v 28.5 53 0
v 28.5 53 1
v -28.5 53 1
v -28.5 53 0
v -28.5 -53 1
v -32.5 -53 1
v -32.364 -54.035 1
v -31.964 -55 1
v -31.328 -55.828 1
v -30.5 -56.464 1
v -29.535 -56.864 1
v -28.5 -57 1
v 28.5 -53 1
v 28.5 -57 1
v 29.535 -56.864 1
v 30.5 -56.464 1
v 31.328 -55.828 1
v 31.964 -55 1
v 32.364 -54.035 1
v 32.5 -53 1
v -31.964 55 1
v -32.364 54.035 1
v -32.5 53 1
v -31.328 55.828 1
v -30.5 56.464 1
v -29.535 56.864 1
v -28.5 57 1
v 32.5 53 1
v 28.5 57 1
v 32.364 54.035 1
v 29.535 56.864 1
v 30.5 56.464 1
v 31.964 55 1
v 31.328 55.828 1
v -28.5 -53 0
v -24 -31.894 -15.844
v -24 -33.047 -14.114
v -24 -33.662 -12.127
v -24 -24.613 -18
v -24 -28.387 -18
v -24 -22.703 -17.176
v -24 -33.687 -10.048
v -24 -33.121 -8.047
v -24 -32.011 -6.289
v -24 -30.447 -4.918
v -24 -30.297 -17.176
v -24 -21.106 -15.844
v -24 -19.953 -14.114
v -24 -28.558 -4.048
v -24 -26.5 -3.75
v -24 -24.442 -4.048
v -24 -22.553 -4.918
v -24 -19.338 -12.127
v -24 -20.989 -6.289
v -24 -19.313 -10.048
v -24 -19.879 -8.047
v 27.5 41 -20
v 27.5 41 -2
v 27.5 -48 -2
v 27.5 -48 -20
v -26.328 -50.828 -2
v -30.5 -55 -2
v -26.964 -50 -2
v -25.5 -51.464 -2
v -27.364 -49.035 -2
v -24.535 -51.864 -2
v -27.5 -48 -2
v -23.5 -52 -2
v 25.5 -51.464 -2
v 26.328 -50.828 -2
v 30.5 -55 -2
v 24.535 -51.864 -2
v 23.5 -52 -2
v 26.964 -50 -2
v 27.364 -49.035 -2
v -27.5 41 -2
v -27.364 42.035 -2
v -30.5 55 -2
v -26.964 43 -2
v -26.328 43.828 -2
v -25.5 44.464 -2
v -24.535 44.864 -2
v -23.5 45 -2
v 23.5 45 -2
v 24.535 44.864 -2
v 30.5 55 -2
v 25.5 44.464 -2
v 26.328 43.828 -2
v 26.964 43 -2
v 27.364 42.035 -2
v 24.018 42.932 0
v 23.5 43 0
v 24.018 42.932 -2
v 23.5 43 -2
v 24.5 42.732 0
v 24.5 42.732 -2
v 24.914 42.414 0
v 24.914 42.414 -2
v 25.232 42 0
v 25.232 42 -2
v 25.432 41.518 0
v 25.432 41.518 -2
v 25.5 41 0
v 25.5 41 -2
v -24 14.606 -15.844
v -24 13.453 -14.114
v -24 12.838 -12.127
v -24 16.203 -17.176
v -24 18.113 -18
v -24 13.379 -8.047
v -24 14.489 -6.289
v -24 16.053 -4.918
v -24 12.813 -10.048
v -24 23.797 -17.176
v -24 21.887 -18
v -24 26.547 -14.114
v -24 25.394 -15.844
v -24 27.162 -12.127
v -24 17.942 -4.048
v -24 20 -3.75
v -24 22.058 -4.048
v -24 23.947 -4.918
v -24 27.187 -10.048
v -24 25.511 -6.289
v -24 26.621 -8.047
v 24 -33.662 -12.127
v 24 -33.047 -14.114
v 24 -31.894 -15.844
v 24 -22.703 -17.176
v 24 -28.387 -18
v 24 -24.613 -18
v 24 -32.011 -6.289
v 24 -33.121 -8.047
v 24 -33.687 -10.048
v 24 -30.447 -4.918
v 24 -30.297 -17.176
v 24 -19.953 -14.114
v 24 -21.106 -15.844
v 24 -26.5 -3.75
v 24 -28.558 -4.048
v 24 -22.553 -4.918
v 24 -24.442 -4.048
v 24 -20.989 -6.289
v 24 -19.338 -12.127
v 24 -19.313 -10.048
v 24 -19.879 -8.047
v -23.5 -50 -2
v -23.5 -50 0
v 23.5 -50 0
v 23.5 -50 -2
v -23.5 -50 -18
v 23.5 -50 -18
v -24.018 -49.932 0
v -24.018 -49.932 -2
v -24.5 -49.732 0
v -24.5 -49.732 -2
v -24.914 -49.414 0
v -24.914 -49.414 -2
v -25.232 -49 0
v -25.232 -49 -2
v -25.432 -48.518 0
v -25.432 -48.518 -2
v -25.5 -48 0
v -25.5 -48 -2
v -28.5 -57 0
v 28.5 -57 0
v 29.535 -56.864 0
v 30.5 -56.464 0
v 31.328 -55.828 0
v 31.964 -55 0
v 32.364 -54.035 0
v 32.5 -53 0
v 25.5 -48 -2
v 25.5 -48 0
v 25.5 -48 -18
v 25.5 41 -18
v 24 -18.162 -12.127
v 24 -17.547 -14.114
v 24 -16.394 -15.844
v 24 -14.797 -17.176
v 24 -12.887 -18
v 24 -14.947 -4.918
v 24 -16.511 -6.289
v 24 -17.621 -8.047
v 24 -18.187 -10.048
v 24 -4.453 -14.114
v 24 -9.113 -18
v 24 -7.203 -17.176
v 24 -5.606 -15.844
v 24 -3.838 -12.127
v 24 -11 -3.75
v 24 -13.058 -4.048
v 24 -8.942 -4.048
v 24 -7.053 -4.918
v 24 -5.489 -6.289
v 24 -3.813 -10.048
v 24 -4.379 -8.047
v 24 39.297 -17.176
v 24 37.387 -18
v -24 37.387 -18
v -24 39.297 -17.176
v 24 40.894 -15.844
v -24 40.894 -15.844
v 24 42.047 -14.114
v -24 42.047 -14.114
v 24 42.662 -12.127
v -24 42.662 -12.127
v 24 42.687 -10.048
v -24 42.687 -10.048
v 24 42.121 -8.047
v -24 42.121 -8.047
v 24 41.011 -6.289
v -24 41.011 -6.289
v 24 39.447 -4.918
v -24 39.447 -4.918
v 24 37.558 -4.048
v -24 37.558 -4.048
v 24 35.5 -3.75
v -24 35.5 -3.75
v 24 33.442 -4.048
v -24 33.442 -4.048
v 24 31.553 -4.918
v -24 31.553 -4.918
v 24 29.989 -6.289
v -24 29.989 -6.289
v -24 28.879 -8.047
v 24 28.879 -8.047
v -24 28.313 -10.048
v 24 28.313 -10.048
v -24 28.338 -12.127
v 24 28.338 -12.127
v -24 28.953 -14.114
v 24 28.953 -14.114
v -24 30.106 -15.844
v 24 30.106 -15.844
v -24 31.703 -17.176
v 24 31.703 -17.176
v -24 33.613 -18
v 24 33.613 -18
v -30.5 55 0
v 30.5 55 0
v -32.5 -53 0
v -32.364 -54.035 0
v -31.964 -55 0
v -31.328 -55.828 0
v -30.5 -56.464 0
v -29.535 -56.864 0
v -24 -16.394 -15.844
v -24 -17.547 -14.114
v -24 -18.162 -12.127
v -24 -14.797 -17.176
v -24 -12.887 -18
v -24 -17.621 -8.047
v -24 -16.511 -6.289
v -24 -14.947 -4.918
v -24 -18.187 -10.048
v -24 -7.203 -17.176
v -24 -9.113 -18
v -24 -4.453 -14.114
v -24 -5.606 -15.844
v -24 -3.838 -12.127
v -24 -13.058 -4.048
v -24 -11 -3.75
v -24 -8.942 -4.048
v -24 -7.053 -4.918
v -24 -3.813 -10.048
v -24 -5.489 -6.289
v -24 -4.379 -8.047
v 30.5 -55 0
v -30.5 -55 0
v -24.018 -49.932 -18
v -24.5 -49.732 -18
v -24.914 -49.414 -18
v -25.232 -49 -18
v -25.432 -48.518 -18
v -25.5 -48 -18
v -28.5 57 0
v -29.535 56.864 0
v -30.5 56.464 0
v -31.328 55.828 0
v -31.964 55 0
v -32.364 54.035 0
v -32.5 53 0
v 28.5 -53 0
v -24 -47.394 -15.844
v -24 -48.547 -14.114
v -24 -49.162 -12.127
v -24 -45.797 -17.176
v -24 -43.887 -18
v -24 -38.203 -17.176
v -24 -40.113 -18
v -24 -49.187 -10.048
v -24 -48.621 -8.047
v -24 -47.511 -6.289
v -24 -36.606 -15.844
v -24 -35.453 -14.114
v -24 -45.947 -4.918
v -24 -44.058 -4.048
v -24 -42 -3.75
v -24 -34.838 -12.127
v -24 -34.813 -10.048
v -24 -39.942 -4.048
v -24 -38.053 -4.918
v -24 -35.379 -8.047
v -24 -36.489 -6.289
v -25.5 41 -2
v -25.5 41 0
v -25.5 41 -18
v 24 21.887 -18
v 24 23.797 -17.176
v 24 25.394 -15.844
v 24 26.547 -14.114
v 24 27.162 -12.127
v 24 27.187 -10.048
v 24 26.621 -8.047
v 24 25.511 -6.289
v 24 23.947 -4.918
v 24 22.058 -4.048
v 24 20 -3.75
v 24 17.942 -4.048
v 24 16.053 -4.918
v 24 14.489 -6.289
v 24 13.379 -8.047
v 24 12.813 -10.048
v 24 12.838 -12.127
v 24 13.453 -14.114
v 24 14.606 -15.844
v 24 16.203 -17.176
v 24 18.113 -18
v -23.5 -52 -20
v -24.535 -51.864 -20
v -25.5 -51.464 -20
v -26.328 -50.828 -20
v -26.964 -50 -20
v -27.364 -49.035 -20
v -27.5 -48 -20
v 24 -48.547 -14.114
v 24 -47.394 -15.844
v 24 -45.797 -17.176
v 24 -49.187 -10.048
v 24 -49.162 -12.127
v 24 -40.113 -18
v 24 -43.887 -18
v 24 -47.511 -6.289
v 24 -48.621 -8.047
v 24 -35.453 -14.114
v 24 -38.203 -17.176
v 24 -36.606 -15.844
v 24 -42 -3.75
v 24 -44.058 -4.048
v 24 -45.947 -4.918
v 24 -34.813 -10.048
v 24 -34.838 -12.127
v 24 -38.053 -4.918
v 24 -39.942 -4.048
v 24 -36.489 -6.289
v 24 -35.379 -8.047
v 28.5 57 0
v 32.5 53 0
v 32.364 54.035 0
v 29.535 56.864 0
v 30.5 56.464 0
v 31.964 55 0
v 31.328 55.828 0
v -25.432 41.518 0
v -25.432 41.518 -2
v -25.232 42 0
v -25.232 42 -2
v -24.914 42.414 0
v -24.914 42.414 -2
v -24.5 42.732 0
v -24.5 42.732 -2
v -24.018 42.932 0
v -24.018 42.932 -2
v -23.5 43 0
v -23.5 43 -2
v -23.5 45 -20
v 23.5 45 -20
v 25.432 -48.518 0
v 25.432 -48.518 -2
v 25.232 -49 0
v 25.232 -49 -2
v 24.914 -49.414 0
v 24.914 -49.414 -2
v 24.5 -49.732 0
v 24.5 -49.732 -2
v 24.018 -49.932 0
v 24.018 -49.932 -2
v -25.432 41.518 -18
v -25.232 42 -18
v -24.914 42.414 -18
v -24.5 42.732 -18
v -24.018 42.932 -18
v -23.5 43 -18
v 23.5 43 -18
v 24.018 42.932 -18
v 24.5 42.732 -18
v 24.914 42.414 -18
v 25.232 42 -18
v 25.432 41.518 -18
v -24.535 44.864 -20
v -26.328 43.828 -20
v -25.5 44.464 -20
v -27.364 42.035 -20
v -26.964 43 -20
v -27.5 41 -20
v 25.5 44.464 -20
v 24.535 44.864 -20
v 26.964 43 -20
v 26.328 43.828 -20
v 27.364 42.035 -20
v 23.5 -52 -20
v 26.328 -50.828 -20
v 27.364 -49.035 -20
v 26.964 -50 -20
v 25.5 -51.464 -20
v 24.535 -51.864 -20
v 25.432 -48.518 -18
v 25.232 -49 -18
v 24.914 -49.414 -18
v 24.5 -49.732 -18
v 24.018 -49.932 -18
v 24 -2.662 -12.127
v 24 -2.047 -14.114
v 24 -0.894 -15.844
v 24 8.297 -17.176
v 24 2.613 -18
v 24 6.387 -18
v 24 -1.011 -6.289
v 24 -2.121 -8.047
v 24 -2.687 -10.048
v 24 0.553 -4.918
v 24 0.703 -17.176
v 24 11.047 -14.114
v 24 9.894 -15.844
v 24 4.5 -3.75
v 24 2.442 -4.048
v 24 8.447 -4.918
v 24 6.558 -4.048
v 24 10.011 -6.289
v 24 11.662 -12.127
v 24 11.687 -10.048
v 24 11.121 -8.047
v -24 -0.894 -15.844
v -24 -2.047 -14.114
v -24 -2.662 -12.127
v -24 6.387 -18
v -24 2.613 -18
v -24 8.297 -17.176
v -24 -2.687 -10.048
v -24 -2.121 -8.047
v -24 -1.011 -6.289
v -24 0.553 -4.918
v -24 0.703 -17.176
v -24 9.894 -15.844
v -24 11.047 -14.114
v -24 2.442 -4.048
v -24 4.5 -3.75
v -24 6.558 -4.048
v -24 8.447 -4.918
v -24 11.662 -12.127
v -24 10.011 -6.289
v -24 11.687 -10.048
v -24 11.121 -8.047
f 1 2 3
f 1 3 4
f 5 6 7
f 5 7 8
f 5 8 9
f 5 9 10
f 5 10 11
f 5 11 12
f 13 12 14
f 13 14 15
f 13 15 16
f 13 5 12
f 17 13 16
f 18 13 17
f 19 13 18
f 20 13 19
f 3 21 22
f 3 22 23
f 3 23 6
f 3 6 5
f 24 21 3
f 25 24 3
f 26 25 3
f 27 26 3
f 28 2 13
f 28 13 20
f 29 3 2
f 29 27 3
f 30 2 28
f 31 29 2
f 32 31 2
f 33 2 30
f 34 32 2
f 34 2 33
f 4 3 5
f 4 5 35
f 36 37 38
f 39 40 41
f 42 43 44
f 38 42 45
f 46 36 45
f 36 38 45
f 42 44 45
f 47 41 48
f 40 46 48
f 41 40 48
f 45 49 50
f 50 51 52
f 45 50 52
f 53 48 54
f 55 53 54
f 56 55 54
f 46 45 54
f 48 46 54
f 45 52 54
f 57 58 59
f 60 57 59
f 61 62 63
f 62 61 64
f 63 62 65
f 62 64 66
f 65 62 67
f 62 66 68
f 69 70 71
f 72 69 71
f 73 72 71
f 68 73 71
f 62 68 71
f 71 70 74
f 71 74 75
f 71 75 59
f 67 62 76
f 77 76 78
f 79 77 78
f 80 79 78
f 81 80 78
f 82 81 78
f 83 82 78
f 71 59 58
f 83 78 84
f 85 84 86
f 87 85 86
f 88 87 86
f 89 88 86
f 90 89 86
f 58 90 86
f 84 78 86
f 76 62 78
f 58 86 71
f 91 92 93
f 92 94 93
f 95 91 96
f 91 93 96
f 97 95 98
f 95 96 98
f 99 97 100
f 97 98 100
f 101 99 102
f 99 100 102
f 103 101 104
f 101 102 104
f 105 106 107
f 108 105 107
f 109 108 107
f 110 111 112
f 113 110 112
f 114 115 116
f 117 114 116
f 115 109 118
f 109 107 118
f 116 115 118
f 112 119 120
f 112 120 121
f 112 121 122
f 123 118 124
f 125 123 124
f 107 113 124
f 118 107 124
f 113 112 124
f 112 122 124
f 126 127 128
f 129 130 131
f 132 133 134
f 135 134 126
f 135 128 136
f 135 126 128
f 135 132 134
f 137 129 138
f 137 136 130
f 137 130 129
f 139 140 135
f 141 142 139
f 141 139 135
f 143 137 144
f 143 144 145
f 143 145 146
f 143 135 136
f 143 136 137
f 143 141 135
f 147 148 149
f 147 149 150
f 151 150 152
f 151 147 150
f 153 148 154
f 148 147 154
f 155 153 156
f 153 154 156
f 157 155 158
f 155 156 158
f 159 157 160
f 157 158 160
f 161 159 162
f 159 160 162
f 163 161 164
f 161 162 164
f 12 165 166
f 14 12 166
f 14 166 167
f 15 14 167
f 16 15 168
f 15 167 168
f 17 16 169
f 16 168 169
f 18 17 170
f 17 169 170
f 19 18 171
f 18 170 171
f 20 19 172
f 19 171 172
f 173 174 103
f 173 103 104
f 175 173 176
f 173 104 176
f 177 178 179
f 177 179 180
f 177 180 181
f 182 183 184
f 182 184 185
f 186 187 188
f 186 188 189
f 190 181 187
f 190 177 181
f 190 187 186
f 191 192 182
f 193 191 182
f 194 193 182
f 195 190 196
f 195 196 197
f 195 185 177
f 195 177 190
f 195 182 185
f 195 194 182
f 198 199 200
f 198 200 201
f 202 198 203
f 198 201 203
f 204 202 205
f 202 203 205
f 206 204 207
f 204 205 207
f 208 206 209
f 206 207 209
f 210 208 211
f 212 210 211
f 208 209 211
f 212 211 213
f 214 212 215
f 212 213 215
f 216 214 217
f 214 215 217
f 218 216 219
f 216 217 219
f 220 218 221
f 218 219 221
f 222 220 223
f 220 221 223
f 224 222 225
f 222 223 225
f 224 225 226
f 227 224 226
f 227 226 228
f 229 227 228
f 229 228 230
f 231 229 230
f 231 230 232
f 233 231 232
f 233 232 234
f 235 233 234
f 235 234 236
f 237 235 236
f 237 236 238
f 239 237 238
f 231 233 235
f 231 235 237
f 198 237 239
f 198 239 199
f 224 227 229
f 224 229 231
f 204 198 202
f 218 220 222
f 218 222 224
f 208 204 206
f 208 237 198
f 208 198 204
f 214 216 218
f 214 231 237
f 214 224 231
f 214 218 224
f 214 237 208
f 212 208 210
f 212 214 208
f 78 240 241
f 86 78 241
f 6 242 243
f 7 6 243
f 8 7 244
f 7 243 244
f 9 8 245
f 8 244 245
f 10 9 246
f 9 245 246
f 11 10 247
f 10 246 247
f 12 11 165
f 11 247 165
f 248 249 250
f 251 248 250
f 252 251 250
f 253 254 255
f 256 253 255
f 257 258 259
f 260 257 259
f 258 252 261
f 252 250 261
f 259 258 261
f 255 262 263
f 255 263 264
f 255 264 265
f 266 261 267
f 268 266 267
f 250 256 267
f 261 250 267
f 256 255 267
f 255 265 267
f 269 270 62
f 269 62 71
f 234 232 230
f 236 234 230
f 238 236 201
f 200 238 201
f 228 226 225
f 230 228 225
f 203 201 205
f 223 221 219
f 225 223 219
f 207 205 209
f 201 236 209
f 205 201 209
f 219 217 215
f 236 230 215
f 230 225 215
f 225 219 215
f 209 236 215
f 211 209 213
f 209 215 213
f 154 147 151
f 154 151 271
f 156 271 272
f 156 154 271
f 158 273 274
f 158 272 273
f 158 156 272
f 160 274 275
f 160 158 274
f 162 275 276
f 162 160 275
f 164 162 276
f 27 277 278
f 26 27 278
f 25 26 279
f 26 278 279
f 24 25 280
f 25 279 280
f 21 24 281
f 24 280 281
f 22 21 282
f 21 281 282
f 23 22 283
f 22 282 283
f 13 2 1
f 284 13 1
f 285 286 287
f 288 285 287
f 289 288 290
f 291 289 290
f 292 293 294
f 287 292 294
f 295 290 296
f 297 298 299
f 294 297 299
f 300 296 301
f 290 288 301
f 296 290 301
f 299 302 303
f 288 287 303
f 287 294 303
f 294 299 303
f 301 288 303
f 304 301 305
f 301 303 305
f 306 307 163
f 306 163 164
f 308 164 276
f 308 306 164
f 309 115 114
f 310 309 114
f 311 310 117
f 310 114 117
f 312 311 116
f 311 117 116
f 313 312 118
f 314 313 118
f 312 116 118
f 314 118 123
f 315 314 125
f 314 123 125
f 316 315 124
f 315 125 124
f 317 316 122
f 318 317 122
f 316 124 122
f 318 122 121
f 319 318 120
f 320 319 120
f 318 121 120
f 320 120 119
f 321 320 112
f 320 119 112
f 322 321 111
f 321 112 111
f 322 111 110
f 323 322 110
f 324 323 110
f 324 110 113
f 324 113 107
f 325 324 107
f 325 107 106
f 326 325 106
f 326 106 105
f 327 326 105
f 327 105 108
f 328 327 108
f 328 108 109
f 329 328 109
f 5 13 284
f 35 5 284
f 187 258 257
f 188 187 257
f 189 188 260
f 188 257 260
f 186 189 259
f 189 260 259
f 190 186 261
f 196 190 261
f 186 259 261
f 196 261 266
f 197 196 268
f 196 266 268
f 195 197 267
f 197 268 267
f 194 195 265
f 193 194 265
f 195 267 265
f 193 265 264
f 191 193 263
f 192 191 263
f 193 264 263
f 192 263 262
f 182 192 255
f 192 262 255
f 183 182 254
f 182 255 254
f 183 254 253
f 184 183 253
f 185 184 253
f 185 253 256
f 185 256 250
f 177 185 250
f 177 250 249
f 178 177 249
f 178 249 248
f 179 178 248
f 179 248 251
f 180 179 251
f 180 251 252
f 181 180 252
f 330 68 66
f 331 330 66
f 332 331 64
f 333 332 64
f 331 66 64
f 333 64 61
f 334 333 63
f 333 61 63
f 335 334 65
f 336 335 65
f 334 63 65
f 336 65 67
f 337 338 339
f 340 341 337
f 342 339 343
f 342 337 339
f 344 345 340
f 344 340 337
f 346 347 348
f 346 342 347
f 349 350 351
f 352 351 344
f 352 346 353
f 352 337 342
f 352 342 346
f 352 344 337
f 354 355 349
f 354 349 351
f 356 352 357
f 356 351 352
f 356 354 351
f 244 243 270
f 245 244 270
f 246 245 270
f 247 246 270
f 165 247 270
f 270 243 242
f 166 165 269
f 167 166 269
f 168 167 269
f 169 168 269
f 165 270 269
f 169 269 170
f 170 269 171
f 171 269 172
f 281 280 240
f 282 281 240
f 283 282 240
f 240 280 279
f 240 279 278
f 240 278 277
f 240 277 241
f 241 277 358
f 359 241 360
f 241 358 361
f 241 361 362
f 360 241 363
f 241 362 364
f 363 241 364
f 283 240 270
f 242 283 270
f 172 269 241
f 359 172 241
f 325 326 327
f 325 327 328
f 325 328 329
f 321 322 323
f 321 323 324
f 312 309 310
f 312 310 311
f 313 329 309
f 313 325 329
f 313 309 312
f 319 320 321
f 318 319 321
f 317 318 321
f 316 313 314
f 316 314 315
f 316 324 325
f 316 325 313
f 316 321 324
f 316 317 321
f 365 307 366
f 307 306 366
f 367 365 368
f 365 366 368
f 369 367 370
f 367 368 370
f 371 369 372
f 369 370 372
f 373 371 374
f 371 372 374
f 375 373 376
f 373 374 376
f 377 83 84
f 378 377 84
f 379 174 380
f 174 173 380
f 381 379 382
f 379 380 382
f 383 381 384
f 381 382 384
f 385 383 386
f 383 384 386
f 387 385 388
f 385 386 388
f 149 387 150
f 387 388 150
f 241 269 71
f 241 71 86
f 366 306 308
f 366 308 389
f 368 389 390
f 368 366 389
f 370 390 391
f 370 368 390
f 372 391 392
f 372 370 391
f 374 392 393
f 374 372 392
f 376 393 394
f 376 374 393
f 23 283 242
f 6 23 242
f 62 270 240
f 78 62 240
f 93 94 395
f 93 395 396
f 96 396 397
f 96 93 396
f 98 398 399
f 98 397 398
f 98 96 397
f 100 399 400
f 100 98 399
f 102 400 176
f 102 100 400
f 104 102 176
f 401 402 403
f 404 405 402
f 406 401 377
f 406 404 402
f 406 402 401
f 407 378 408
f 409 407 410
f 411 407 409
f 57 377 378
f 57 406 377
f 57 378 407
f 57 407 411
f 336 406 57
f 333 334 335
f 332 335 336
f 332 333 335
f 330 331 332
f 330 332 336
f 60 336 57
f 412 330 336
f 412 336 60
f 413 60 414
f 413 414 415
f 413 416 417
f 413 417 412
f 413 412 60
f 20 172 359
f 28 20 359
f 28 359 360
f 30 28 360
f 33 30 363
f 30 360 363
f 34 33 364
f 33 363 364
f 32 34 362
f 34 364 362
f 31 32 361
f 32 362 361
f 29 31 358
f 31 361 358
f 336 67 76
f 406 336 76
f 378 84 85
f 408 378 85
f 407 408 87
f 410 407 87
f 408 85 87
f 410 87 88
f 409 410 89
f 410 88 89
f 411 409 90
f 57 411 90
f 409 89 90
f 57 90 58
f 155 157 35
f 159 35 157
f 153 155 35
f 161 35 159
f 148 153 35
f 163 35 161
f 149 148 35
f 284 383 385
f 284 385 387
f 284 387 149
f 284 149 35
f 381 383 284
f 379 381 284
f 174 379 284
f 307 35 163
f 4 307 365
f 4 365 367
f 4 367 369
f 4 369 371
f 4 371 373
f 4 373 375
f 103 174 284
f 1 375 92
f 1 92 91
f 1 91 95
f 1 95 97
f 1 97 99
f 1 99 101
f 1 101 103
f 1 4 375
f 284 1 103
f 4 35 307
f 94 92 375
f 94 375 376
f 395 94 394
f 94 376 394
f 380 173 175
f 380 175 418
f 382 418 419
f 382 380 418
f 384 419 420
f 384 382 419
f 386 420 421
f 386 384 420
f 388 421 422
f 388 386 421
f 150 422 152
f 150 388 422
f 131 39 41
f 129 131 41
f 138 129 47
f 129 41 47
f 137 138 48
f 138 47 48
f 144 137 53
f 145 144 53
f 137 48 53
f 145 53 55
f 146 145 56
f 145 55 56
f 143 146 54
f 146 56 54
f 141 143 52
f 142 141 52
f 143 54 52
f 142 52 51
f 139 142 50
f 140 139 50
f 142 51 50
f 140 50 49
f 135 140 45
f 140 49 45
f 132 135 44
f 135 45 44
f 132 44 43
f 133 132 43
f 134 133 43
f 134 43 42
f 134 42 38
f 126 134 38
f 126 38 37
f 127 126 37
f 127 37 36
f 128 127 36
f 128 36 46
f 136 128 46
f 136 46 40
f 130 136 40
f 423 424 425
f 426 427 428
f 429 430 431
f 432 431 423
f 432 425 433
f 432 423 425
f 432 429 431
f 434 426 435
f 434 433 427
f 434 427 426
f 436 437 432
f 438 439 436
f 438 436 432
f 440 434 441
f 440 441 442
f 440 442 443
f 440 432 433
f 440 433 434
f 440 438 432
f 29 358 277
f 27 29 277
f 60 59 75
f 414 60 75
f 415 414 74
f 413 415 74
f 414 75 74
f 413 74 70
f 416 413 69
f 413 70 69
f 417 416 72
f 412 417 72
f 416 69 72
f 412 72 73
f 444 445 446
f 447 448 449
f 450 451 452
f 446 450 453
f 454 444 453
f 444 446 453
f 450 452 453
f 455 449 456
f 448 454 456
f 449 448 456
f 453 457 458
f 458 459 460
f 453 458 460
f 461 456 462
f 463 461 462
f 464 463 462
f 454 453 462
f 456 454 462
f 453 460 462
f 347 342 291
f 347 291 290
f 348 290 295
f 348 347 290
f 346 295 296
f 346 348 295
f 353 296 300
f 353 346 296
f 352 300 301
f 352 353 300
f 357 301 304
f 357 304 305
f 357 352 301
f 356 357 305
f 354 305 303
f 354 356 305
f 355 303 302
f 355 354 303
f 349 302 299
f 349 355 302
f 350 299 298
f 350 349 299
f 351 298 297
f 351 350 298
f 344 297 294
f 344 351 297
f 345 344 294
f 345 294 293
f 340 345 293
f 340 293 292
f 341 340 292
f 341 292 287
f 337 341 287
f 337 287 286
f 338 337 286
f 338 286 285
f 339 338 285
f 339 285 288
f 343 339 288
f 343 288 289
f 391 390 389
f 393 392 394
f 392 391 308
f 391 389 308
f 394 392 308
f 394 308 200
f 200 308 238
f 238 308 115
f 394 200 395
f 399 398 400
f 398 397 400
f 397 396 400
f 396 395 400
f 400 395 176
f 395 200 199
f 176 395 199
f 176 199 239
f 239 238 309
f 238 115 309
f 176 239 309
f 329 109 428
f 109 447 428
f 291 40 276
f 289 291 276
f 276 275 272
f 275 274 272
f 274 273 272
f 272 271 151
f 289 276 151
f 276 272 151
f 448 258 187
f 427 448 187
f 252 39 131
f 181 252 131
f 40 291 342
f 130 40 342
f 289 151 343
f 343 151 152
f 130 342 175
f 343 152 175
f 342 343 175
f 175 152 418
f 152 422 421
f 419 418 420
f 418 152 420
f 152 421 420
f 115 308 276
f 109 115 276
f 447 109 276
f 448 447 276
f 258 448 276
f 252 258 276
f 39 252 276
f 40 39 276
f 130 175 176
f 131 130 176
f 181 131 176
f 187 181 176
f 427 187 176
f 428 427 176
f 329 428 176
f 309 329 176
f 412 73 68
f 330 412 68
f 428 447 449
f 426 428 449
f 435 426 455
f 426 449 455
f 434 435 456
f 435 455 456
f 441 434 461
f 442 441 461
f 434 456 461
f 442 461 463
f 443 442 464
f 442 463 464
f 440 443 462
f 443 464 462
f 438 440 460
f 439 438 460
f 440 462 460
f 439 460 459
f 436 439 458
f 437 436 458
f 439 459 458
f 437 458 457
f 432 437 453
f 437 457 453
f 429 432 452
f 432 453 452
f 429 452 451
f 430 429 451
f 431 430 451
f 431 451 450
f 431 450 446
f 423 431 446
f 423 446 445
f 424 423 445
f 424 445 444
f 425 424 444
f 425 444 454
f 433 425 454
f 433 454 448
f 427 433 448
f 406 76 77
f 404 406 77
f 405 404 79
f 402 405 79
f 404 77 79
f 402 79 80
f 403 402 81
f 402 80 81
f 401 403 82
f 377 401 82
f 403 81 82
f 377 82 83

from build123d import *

# Parameters (mm, degrees)
F1_DEPTH     = 1
F2_W         = 61
F2_H         = 110
F3_DEPTH     = 2
F5_DEPTH     = 18
F6_T         = 2
F6_T3_DEPTH  = 114
F6_T5_DEPTH  = 65
F6_T7_DEPTH  = 51
F6_T9_DEPTH  = 93
F6_T12_ANGLE = 90.000000001
F6_T14_ANGLE = 90.000000001
F6_T16_ANGLE = 90.000000001
F6_T18_ANGLE = 90.000000001
F7_R         = 7.25
F8_DEPTH     = 24


# Not quite as in the source:
# - a shell that OpenCascade refuses in one call is made with other operations: the cavity is built on its own and cut out


with BuildPart() as f1:
    # F0 (on Top) → F1 (new body)
    with BuildSketch(Plane.XY):
        with BuildLine():
            ThreePointArc((32.5, 53), (31.3284271247, 55.8284271247), (28.5, 57))
            Line((28.5, 57), (-28.5, 57))
            ThreePointArc((-28.5, 57), (-31.3284271247, 55.8284271247), (-32.5, 53))
            Line((-32.5, 53), (-32.5, -53))
            ThreePointArc((-32.5, -53), (-31.3284271247, -55.8284271247), (-28.5, -57))
            Line((-28.5, -57), (28.5, -57))
            ThreePointArc((28.5, -57), (31.3284271247, -55.8284271247), (32.5, -53))
            Line((32.5, -53), (32.5, 53))
        make_face()
    extrude(amount=F1_DEPTH)

    # F2 (on Top) → F3 (join)
    with BuildSketch(Plane.XY):
        Rectangle(F2_W, F2_H)
    extrude(amount=-F3_DEPTH)

    # F4 (on face) → F5 (join)
    with BuildSketch(Plane(origin=(0, 0, -2), x_dir=(1, 0, 0), z_dir=(0, 0, -1))):
        with BuildLine():
            Line((23.5, 52), (-23.5, 52))
            ThreePointArc((-23.5, 52), (-26.3284271247, 50.8284271247), (-27.5, 48))
            Line((-27.5, 48), (-27.5, -41))
            ThreePointArc((-27.5, -41), (-26.3284271247, -43.8284271247), (-23.5, -45))
            Line((-23.5, -45), (23.5, -45))
            ThreePointArc((23.5, -45), (26.3284271247, -43.8284271247), (27.5, -41))
            Line((27.5, -41), (27.5, 48))
            ThreePointArc((27.5, 48), (26.3284271247, 50.8284271247), (23.5, 52))
        make_face()
    extrude(amount=F5_DEPTH)

    # F6: shell of thickness 2, made by hand


with BuildPart() as f6_core1:
    # F6_t2: copy of F1
    add(f1.part)

    # the walls: a layer under each face that stays
    f6_faces = [f6_core1.faces().sort_by_distance(p)[0] for p in [
        (31.3284271247, 55.8284271247, 0.5),
        (32.5, 0, 0.5),
        (0, 57, 0.5),
        (22.34375, -55.5925925926, 0),
        (31.3284271247, -55.8284271247, 0.5),
        (-31.3284271247, 55.8284271247, 0.5),
        (0, -57, 0.5),
        (-32.5, 0, 0.5),
        (-31.3284271247, -55.8284271247, 0.5),
        (30.5, 0, -1),
        (0, 55, -1),
        (-30.5, 0, -1),
        (0, -55, -1),
        (-26.1428571429, 47.1428571429, -2),
        (26.3284271247, 43.8284271247, -11),
        (0, 45, -11),
        (-26.3284271247, 43.8284271247, -11),
        (-27.5, -3.5, -11),
        (-26.3284271247, -50.8284271247, -11),
        (0, -52, -11),
        (26.3284271247, -50.8284271247, -11),
        (27.5, -3.5, -11),
        (0, -3.5, -20),
    ]]
    thicken(f6_faces, amount=-F6_T, mode=Mode.SUBTRACT)

    # F6_s4 → F6_t3 (cut)
    with BuildSketch(Plane.XZ.offset(-57)):
        Polygon((30.52, -0.02), (30.5, 2), (28.5, 2), (28.5, 0), align=None)
        Polygon((-30.52, -0.02), (-30.5, 2), (-28.5, 2), (-28.5, 0), align=None)
    extrude(amount=F6_T3_DEPTH, mode=Mode.SUBTRACT)

    # F6_s6 → F6_t5 (cut)
    with BuildSketch(Plane.YZ.offset(-32.5)):
        Polygon((55.02, -0.02), (55, 2), (53, 2), (53, 0), align=None)
        Polygon((-55.02, -0.02), (-55, 2), (-53, 2), (-53, 0), align=None)
    extrude(amount=F6_T5_DEPTH, mode=Mode.SUBTRACT)

    # F6_s8 → F6_t7 (cut)
    with BuildSketch(Plane.YZ.offset(-25.5)):
        Polygon((45.02, -2.02), (45, 0), (43, 0), (43, -2), align=None)
        Polygon((-52.02, -2.02), (-52, 0), (-50, 0), (-50, -2), align=None)
    extrude(amount=F6_T7_DEPTH, mode=Mode.SUBTRACT)

    # F6_s10 → F6_t9 (cut)
    with BuildSketch(Plane.XZ.offset(-43)):
        Polygon((-27.52, -2.02), (-27.5, 0), (-25.5, 0), (-25.5, -2), align=None)
        Polygon((27.52, -2.02), (27.5, 0), (25.5, 0), (25.5, -2), align=None)
    extrude(amount=F6_T9_DEPTH, mode=Mode.SUBTRACT)

    # F6_s11 → F6_t12 (revolve, cut)
    with BuildSketch(Plane.YZ.offset(23.5)):
        Polygon((45.02, -2.02), (45, 0), (43, 0), (43, -2), align=None)
    revolve(axis=Axis((23.5, 41, -2), (0, 0, -1)), revolution_arc=F6_T12_ANGLE, mode=Mode.SUBTRACT)

    # F6_s13 → F6_t14 (revolve, cut)
    with BuildSketch(Plane.XZ.offset(-41)):
        Polygon((-27.52, -2.02), (-27.5, 0), (-25.5, 0), (-25.5, -2), align=None)
    revolve(axis=Axis((-23.5, 41, -2), (0, 0, -1)), revolution_arc=F6_T14_ANGLE, mode=Mode.SUBTRACT)

    # F6_s15 → F6_t16 (revolve, cut)
    with BuildSketch(Plane.YZ.offset(-23.5)):
        Polygon((-52.02, -2.02), (-52, 0), (-50, 0), (-50, -2), align=None)
    revolve(axis=Axis((-23.5, -48, -2), (0, 0, -1)), revolution_arc=F6_T16_ANGLE, mode=Mode.SUBTRACT)

    # F6_s17 → F6_t18 (revolve, cut)
    with BuildSketch(Plane.XZ.offset(48)):
        Polygon((27.52, -2.02), (27.5, 0), (25.5, 0), (25.5, -2), align=None)
    revolve(axis=Axis((23.5, -48, -2), (0, 0, -1)), revolution_arc=F6_T18_ANGLE, mode=Mode.SUBTRACT)


with BuildPart() as f1_1:
    add(f1.part)

    # what is left inside the walls is the cavity
    f6_cavity = [f6_core1.part.solids().sort_by_distance(p)[0] for p in [
        (0, -17.666667, 0.98),
    ]]
    add(f6_cavity, mode=Mode.SUBTRACT)

    # F7 (on Right) → F8 (join, symmetric)
    with BuildSketch(Plane.YZ):
        with Locations((35.5, -11)):
            Circle(F7_R)
        with Locations((20, -11)):
            Circle(F7_R)
        with Locations((4.5, -11)):
            Circle(F7_R)
        with Locations((-11, -11)):
            Circle(F7_R)
        with Locations((-26.5, -11)):
            Circle(F7_R)
        with Locations((-42, -11)):
            Circle(F7_R)
    extrude(amount=F8_DEPTH, both=True)


solid = f1_1.part
